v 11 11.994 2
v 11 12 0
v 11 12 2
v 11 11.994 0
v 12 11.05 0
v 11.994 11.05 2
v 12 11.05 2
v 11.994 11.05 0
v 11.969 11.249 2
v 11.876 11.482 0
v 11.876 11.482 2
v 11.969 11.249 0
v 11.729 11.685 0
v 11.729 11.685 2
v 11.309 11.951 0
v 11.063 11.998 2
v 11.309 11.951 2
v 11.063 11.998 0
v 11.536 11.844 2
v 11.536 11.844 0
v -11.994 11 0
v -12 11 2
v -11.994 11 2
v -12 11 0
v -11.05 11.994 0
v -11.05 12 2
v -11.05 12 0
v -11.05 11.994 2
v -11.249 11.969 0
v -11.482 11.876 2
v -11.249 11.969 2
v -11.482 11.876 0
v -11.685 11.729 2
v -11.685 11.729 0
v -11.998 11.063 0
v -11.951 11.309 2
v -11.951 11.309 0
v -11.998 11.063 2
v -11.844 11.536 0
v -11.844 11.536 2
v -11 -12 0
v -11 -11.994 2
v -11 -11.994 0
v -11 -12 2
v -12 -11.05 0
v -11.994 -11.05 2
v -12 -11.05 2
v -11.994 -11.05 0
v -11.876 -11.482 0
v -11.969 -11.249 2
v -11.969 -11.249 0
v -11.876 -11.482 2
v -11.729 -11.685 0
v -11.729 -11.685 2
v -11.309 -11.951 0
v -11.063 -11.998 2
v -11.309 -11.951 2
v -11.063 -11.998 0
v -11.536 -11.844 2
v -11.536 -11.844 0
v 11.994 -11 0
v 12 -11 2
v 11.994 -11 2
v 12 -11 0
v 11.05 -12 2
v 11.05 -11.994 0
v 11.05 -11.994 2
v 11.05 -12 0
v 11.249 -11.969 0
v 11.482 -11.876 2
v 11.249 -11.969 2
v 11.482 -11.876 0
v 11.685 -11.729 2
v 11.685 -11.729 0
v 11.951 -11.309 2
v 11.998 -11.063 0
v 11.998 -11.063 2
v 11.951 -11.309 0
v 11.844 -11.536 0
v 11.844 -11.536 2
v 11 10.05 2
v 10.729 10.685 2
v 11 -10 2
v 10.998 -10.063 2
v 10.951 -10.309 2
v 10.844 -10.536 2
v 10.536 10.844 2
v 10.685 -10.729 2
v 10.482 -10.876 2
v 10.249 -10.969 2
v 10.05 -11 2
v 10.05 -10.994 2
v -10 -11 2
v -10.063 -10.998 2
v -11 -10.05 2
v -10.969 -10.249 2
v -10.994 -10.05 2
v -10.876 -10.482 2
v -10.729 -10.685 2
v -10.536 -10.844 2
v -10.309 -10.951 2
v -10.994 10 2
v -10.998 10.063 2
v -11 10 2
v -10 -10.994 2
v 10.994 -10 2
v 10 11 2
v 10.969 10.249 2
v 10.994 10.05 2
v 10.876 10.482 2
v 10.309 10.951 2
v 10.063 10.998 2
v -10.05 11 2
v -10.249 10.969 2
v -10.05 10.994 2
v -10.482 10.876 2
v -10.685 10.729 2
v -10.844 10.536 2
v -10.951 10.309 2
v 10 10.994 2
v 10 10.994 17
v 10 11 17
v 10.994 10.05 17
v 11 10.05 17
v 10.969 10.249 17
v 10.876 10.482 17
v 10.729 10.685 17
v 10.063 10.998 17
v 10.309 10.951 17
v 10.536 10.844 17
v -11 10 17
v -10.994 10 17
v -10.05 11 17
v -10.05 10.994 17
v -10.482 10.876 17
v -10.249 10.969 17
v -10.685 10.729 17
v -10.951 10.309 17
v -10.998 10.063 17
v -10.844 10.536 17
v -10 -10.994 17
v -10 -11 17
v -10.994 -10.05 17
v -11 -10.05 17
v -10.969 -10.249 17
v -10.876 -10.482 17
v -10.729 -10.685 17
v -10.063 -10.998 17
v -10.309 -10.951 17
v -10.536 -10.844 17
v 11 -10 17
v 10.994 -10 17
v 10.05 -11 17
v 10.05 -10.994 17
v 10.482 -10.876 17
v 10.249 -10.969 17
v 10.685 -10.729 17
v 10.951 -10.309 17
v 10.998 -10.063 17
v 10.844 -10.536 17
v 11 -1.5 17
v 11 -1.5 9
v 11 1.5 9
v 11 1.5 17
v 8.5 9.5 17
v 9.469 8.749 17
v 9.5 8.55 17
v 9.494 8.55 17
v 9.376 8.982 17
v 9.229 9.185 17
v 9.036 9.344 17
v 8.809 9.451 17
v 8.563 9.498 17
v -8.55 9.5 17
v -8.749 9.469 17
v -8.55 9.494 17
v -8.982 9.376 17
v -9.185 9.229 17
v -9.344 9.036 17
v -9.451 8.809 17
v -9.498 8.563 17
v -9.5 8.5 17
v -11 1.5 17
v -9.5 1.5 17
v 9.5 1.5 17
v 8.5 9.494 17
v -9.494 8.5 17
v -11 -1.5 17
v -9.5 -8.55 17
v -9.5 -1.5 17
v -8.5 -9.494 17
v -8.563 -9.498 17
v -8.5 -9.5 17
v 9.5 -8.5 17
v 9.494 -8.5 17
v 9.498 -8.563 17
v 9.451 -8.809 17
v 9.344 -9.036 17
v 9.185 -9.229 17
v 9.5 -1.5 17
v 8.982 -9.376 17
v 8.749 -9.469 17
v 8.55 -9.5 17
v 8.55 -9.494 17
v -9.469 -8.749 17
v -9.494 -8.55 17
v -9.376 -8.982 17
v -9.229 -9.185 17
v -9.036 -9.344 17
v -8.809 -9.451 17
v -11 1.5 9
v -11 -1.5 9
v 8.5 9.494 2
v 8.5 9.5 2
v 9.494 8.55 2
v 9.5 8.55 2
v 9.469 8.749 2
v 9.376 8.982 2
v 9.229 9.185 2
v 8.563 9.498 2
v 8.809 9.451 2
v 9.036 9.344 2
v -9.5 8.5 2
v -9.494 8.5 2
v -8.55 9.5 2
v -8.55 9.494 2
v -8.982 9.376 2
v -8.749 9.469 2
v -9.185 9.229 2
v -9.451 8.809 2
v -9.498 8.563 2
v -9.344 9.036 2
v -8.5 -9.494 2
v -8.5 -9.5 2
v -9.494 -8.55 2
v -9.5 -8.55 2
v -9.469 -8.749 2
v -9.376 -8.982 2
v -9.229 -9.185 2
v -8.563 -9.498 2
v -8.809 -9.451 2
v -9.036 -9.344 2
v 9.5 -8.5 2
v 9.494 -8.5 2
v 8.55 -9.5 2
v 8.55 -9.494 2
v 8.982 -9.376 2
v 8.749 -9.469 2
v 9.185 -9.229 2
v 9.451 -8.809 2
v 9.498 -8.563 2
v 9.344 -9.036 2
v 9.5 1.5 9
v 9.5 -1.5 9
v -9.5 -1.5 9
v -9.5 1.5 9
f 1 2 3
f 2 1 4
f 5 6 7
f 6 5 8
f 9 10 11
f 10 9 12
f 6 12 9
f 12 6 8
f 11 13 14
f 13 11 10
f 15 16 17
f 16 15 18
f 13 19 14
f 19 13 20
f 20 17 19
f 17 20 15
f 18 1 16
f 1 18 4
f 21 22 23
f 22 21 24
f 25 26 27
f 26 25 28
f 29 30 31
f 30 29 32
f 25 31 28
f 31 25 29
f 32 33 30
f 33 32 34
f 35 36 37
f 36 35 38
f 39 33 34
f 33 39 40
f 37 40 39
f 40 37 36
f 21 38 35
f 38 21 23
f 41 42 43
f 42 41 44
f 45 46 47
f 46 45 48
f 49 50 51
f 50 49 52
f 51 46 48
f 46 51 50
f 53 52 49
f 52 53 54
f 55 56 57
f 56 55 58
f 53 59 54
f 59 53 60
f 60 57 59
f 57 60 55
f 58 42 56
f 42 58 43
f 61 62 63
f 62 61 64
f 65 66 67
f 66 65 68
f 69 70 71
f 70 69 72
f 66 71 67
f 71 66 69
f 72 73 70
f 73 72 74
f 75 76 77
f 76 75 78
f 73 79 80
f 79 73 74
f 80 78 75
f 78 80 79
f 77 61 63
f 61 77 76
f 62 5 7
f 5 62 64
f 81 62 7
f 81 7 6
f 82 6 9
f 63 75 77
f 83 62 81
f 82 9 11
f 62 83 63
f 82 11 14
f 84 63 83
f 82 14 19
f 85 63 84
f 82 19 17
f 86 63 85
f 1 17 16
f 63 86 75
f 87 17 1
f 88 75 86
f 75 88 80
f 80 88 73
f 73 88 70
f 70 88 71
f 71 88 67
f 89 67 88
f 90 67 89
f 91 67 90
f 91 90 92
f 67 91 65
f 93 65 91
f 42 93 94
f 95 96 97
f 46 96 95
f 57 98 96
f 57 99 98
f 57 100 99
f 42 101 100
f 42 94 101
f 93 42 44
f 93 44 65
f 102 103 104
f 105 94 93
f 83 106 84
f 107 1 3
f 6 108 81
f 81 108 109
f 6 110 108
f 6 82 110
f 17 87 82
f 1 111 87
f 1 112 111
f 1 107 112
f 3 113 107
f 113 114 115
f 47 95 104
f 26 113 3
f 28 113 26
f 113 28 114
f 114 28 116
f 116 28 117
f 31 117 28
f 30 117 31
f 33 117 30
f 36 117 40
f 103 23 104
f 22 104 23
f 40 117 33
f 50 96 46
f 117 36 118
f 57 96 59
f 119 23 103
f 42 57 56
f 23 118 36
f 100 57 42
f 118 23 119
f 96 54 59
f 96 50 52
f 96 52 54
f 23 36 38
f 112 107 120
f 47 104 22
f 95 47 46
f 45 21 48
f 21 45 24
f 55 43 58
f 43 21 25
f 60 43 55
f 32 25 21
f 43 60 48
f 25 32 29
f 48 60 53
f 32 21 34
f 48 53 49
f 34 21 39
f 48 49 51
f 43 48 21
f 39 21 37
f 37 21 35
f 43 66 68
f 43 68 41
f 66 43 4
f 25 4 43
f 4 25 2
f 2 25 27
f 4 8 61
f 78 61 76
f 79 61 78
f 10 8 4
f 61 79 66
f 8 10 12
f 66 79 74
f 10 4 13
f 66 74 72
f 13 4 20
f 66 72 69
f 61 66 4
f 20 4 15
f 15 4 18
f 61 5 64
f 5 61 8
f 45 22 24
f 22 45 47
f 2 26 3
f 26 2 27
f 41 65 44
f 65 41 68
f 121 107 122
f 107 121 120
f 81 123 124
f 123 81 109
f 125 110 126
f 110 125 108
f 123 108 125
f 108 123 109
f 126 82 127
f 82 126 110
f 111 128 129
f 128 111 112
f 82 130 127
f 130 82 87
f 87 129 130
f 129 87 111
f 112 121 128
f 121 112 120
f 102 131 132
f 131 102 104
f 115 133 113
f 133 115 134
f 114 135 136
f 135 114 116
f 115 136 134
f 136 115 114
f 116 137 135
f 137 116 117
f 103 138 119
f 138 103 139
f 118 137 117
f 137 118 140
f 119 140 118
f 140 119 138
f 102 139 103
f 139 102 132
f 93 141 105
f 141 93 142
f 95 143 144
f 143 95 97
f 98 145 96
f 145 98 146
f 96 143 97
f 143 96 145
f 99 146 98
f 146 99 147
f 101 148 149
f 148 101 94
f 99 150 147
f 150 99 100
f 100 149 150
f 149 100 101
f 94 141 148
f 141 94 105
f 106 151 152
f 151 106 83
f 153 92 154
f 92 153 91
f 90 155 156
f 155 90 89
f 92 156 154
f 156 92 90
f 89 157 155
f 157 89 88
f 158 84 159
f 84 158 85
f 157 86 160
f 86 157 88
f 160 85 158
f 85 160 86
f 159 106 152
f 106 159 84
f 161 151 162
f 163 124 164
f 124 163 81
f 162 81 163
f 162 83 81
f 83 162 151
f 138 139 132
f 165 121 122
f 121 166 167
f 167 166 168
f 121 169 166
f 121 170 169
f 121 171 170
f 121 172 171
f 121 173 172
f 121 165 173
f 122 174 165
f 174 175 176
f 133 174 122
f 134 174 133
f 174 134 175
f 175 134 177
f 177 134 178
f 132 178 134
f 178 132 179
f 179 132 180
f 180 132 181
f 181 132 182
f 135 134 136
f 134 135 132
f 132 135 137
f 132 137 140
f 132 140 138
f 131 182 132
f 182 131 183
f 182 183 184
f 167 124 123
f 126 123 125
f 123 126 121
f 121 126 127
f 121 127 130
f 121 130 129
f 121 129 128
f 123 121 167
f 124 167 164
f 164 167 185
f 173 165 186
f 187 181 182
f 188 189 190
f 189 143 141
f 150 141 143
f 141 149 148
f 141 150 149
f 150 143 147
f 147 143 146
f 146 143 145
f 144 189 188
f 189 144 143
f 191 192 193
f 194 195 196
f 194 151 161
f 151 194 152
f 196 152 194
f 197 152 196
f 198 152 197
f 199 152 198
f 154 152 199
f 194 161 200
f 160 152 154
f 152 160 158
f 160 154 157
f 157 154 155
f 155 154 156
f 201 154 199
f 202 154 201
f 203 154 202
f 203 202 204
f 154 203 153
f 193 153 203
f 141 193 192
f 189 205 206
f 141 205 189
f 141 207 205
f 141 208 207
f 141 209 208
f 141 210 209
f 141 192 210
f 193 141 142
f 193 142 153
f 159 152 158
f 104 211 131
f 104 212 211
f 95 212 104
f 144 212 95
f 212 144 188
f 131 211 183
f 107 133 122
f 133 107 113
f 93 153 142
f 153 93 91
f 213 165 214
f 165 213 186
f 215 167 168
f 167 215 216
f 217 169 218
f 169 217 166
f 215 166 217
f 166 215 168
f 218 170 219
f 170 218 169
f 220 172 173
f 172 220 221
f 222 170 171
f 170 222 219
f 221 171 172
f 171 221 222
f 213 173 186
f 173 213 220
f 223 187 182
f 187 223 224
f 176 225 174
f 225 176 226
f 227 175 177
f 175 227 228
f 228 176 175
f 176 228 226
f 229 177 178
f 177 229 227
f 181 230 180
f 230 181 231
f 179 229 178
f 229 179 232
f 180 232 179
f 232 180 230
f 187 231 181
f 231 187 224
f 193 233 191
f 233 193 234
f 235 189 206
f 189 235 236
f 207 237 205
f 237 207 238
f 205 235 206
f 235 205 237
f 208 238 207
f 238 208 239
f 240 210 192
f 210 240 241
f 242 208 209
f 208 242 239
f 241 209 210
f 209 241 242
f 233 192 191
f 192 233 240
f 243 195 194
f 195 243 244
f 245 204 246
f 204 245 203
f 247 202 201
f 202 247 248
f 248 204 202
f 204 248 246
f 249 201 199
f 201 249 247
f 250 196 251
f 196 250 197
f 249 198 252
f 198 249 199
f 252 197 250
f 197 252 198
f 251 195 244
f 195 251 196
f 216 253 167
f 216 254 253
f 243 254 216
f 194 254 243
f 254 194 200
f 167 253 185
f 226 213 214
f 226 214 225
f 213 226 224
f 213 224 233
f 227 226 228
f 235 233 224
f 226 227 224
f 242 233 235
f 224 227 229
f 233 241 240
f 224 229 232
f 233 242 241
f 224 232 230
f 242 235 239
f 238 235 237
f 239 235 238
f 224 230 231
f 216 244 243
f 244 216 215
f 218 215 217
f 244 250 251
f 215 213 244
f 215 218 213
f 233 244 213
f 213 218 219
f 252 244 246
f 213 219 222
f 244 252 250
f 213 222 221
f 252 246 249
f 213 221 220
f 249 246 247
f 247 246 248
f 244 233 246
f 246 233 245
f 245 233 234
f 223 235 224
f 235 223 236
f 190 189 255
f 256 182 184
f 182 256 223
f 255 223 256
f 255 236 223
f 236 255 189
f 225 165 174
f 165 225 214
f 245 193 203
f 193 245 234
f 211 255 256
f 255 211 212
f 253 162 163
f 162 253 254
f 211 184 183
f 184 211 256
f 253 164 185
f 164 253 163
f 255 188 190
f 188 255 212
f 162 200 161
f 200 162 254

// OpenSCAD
// [FL_INDEX: keywords="openscad, 3d_parametric, Aluminium_Square_Tube_Plug, csg_solid" | COT="Parametric OpenSCAD design from 3DCodeverse"]
// Title: Aluminium Square Tube Plug

/*
http://codeviewer.org/view/code:1b36 
Copyright (C) 2011 Sergio Vilches
This program is free software: you can redistribute it and/or modify it under the terms of the GNU General Public License as published by the Free Software Foundation, either version 3 of the License, or (at your option) any later version.
This program is distributed in the hope that it will be useful, but WITHOUT ANY WARRANTY; without even the implied warranty of MERCHANTABILITY or FITNESS FOR A PARTICULAR PURPOSE. See the GNU General Public License for more details. You should have received a copy of the GNU General Public License along with this program. If not, see <http://www.gnu.org/licenses/>.
Contact: s.vilches.e@gmail.com


    ----------------------------------------------------------- 
                 Round Corners Cube (Extruded)                
      roundCornersCube(x,y,z,r) Where:                        
         - x = Xdir width                                     
         - y = Ydir width                                     
         - z = Height of the cube                             
         - r = Rounding radious                               
                                                              
      Example: roundCornerCube(10,10,2,1);                    
     *Some times it's needed to use F6 to see good results!   
 	 ----------------------------------------------------------- 
*/
// Test it!
// roundCornersCube(10,5,2,1);


module createMeniscus(h,radius) // This module creates the shape that needs to be substracted from a cube to make its corners rounded.
difference(){        //This shape is basicly the difference between a quarter of cylinder and a cube
   translate([radius/2+0.1,radius/2+0.1,0]){
      cube([radius+0.2,radius+0.1,h+0.2],center=true);         // All that 0.x numbers are to avoid "ghost boundaries" when substracting
   }

   cylinder(h=h+0.2,r=radius,$fn = 25,center=true);
}


module roundCornersCube(x,y,z,r)  // Now we just substract the shape we have created in the four corners
difference(){
   cube([x,y,z], center=true);

translate([x/2-r,y/2-r]){  // We move to the first corner (x,y)
      rotate(0){  
         createMeniscus(z,r); // And substract the meniscus
      }
   }
   translate([-x/2+r,y/2-r]){ // To the second corner (-x,y)
      rotate(90){
         createMeniscus(z,r); // But this time we have to rotate the meniscus 90 deg
      }
   }
      translate([-x/2+r,-y/2+r]){ // ... 
      rotate(180){
         createMeniscus(z,r);
      }
   }
      translate([x/2-r,-y/2+r]){
      rotate(270){
         createMeniscus(z,r);
      }
   }
}


bar_dia = 24;
wall_thick = 2;
plug_length = 15;
slot_height = 8;
slot_width = 3;

difference(){
union(){
translate([0,0,1]) roundCornersCube(bar_dia,bar_dia,2,1);
translate([0,0,(plug_length/2) + 2]) roundCornersCube(bar_dia - wall_thick,bar_dia - wall_thick,plug_length,1);
}
translate([0,0,(plug_length/2) + 2]) roundCornersCube(bar_dia - wall_thick - 3,bar_dia - wall_thick - 3,plug_length,1);
translate([-bar_dia/2,-(slot_width/2),(plug_length-slot_height)+2]) cube([bar_dia,slot_width,slot_height]);
}
